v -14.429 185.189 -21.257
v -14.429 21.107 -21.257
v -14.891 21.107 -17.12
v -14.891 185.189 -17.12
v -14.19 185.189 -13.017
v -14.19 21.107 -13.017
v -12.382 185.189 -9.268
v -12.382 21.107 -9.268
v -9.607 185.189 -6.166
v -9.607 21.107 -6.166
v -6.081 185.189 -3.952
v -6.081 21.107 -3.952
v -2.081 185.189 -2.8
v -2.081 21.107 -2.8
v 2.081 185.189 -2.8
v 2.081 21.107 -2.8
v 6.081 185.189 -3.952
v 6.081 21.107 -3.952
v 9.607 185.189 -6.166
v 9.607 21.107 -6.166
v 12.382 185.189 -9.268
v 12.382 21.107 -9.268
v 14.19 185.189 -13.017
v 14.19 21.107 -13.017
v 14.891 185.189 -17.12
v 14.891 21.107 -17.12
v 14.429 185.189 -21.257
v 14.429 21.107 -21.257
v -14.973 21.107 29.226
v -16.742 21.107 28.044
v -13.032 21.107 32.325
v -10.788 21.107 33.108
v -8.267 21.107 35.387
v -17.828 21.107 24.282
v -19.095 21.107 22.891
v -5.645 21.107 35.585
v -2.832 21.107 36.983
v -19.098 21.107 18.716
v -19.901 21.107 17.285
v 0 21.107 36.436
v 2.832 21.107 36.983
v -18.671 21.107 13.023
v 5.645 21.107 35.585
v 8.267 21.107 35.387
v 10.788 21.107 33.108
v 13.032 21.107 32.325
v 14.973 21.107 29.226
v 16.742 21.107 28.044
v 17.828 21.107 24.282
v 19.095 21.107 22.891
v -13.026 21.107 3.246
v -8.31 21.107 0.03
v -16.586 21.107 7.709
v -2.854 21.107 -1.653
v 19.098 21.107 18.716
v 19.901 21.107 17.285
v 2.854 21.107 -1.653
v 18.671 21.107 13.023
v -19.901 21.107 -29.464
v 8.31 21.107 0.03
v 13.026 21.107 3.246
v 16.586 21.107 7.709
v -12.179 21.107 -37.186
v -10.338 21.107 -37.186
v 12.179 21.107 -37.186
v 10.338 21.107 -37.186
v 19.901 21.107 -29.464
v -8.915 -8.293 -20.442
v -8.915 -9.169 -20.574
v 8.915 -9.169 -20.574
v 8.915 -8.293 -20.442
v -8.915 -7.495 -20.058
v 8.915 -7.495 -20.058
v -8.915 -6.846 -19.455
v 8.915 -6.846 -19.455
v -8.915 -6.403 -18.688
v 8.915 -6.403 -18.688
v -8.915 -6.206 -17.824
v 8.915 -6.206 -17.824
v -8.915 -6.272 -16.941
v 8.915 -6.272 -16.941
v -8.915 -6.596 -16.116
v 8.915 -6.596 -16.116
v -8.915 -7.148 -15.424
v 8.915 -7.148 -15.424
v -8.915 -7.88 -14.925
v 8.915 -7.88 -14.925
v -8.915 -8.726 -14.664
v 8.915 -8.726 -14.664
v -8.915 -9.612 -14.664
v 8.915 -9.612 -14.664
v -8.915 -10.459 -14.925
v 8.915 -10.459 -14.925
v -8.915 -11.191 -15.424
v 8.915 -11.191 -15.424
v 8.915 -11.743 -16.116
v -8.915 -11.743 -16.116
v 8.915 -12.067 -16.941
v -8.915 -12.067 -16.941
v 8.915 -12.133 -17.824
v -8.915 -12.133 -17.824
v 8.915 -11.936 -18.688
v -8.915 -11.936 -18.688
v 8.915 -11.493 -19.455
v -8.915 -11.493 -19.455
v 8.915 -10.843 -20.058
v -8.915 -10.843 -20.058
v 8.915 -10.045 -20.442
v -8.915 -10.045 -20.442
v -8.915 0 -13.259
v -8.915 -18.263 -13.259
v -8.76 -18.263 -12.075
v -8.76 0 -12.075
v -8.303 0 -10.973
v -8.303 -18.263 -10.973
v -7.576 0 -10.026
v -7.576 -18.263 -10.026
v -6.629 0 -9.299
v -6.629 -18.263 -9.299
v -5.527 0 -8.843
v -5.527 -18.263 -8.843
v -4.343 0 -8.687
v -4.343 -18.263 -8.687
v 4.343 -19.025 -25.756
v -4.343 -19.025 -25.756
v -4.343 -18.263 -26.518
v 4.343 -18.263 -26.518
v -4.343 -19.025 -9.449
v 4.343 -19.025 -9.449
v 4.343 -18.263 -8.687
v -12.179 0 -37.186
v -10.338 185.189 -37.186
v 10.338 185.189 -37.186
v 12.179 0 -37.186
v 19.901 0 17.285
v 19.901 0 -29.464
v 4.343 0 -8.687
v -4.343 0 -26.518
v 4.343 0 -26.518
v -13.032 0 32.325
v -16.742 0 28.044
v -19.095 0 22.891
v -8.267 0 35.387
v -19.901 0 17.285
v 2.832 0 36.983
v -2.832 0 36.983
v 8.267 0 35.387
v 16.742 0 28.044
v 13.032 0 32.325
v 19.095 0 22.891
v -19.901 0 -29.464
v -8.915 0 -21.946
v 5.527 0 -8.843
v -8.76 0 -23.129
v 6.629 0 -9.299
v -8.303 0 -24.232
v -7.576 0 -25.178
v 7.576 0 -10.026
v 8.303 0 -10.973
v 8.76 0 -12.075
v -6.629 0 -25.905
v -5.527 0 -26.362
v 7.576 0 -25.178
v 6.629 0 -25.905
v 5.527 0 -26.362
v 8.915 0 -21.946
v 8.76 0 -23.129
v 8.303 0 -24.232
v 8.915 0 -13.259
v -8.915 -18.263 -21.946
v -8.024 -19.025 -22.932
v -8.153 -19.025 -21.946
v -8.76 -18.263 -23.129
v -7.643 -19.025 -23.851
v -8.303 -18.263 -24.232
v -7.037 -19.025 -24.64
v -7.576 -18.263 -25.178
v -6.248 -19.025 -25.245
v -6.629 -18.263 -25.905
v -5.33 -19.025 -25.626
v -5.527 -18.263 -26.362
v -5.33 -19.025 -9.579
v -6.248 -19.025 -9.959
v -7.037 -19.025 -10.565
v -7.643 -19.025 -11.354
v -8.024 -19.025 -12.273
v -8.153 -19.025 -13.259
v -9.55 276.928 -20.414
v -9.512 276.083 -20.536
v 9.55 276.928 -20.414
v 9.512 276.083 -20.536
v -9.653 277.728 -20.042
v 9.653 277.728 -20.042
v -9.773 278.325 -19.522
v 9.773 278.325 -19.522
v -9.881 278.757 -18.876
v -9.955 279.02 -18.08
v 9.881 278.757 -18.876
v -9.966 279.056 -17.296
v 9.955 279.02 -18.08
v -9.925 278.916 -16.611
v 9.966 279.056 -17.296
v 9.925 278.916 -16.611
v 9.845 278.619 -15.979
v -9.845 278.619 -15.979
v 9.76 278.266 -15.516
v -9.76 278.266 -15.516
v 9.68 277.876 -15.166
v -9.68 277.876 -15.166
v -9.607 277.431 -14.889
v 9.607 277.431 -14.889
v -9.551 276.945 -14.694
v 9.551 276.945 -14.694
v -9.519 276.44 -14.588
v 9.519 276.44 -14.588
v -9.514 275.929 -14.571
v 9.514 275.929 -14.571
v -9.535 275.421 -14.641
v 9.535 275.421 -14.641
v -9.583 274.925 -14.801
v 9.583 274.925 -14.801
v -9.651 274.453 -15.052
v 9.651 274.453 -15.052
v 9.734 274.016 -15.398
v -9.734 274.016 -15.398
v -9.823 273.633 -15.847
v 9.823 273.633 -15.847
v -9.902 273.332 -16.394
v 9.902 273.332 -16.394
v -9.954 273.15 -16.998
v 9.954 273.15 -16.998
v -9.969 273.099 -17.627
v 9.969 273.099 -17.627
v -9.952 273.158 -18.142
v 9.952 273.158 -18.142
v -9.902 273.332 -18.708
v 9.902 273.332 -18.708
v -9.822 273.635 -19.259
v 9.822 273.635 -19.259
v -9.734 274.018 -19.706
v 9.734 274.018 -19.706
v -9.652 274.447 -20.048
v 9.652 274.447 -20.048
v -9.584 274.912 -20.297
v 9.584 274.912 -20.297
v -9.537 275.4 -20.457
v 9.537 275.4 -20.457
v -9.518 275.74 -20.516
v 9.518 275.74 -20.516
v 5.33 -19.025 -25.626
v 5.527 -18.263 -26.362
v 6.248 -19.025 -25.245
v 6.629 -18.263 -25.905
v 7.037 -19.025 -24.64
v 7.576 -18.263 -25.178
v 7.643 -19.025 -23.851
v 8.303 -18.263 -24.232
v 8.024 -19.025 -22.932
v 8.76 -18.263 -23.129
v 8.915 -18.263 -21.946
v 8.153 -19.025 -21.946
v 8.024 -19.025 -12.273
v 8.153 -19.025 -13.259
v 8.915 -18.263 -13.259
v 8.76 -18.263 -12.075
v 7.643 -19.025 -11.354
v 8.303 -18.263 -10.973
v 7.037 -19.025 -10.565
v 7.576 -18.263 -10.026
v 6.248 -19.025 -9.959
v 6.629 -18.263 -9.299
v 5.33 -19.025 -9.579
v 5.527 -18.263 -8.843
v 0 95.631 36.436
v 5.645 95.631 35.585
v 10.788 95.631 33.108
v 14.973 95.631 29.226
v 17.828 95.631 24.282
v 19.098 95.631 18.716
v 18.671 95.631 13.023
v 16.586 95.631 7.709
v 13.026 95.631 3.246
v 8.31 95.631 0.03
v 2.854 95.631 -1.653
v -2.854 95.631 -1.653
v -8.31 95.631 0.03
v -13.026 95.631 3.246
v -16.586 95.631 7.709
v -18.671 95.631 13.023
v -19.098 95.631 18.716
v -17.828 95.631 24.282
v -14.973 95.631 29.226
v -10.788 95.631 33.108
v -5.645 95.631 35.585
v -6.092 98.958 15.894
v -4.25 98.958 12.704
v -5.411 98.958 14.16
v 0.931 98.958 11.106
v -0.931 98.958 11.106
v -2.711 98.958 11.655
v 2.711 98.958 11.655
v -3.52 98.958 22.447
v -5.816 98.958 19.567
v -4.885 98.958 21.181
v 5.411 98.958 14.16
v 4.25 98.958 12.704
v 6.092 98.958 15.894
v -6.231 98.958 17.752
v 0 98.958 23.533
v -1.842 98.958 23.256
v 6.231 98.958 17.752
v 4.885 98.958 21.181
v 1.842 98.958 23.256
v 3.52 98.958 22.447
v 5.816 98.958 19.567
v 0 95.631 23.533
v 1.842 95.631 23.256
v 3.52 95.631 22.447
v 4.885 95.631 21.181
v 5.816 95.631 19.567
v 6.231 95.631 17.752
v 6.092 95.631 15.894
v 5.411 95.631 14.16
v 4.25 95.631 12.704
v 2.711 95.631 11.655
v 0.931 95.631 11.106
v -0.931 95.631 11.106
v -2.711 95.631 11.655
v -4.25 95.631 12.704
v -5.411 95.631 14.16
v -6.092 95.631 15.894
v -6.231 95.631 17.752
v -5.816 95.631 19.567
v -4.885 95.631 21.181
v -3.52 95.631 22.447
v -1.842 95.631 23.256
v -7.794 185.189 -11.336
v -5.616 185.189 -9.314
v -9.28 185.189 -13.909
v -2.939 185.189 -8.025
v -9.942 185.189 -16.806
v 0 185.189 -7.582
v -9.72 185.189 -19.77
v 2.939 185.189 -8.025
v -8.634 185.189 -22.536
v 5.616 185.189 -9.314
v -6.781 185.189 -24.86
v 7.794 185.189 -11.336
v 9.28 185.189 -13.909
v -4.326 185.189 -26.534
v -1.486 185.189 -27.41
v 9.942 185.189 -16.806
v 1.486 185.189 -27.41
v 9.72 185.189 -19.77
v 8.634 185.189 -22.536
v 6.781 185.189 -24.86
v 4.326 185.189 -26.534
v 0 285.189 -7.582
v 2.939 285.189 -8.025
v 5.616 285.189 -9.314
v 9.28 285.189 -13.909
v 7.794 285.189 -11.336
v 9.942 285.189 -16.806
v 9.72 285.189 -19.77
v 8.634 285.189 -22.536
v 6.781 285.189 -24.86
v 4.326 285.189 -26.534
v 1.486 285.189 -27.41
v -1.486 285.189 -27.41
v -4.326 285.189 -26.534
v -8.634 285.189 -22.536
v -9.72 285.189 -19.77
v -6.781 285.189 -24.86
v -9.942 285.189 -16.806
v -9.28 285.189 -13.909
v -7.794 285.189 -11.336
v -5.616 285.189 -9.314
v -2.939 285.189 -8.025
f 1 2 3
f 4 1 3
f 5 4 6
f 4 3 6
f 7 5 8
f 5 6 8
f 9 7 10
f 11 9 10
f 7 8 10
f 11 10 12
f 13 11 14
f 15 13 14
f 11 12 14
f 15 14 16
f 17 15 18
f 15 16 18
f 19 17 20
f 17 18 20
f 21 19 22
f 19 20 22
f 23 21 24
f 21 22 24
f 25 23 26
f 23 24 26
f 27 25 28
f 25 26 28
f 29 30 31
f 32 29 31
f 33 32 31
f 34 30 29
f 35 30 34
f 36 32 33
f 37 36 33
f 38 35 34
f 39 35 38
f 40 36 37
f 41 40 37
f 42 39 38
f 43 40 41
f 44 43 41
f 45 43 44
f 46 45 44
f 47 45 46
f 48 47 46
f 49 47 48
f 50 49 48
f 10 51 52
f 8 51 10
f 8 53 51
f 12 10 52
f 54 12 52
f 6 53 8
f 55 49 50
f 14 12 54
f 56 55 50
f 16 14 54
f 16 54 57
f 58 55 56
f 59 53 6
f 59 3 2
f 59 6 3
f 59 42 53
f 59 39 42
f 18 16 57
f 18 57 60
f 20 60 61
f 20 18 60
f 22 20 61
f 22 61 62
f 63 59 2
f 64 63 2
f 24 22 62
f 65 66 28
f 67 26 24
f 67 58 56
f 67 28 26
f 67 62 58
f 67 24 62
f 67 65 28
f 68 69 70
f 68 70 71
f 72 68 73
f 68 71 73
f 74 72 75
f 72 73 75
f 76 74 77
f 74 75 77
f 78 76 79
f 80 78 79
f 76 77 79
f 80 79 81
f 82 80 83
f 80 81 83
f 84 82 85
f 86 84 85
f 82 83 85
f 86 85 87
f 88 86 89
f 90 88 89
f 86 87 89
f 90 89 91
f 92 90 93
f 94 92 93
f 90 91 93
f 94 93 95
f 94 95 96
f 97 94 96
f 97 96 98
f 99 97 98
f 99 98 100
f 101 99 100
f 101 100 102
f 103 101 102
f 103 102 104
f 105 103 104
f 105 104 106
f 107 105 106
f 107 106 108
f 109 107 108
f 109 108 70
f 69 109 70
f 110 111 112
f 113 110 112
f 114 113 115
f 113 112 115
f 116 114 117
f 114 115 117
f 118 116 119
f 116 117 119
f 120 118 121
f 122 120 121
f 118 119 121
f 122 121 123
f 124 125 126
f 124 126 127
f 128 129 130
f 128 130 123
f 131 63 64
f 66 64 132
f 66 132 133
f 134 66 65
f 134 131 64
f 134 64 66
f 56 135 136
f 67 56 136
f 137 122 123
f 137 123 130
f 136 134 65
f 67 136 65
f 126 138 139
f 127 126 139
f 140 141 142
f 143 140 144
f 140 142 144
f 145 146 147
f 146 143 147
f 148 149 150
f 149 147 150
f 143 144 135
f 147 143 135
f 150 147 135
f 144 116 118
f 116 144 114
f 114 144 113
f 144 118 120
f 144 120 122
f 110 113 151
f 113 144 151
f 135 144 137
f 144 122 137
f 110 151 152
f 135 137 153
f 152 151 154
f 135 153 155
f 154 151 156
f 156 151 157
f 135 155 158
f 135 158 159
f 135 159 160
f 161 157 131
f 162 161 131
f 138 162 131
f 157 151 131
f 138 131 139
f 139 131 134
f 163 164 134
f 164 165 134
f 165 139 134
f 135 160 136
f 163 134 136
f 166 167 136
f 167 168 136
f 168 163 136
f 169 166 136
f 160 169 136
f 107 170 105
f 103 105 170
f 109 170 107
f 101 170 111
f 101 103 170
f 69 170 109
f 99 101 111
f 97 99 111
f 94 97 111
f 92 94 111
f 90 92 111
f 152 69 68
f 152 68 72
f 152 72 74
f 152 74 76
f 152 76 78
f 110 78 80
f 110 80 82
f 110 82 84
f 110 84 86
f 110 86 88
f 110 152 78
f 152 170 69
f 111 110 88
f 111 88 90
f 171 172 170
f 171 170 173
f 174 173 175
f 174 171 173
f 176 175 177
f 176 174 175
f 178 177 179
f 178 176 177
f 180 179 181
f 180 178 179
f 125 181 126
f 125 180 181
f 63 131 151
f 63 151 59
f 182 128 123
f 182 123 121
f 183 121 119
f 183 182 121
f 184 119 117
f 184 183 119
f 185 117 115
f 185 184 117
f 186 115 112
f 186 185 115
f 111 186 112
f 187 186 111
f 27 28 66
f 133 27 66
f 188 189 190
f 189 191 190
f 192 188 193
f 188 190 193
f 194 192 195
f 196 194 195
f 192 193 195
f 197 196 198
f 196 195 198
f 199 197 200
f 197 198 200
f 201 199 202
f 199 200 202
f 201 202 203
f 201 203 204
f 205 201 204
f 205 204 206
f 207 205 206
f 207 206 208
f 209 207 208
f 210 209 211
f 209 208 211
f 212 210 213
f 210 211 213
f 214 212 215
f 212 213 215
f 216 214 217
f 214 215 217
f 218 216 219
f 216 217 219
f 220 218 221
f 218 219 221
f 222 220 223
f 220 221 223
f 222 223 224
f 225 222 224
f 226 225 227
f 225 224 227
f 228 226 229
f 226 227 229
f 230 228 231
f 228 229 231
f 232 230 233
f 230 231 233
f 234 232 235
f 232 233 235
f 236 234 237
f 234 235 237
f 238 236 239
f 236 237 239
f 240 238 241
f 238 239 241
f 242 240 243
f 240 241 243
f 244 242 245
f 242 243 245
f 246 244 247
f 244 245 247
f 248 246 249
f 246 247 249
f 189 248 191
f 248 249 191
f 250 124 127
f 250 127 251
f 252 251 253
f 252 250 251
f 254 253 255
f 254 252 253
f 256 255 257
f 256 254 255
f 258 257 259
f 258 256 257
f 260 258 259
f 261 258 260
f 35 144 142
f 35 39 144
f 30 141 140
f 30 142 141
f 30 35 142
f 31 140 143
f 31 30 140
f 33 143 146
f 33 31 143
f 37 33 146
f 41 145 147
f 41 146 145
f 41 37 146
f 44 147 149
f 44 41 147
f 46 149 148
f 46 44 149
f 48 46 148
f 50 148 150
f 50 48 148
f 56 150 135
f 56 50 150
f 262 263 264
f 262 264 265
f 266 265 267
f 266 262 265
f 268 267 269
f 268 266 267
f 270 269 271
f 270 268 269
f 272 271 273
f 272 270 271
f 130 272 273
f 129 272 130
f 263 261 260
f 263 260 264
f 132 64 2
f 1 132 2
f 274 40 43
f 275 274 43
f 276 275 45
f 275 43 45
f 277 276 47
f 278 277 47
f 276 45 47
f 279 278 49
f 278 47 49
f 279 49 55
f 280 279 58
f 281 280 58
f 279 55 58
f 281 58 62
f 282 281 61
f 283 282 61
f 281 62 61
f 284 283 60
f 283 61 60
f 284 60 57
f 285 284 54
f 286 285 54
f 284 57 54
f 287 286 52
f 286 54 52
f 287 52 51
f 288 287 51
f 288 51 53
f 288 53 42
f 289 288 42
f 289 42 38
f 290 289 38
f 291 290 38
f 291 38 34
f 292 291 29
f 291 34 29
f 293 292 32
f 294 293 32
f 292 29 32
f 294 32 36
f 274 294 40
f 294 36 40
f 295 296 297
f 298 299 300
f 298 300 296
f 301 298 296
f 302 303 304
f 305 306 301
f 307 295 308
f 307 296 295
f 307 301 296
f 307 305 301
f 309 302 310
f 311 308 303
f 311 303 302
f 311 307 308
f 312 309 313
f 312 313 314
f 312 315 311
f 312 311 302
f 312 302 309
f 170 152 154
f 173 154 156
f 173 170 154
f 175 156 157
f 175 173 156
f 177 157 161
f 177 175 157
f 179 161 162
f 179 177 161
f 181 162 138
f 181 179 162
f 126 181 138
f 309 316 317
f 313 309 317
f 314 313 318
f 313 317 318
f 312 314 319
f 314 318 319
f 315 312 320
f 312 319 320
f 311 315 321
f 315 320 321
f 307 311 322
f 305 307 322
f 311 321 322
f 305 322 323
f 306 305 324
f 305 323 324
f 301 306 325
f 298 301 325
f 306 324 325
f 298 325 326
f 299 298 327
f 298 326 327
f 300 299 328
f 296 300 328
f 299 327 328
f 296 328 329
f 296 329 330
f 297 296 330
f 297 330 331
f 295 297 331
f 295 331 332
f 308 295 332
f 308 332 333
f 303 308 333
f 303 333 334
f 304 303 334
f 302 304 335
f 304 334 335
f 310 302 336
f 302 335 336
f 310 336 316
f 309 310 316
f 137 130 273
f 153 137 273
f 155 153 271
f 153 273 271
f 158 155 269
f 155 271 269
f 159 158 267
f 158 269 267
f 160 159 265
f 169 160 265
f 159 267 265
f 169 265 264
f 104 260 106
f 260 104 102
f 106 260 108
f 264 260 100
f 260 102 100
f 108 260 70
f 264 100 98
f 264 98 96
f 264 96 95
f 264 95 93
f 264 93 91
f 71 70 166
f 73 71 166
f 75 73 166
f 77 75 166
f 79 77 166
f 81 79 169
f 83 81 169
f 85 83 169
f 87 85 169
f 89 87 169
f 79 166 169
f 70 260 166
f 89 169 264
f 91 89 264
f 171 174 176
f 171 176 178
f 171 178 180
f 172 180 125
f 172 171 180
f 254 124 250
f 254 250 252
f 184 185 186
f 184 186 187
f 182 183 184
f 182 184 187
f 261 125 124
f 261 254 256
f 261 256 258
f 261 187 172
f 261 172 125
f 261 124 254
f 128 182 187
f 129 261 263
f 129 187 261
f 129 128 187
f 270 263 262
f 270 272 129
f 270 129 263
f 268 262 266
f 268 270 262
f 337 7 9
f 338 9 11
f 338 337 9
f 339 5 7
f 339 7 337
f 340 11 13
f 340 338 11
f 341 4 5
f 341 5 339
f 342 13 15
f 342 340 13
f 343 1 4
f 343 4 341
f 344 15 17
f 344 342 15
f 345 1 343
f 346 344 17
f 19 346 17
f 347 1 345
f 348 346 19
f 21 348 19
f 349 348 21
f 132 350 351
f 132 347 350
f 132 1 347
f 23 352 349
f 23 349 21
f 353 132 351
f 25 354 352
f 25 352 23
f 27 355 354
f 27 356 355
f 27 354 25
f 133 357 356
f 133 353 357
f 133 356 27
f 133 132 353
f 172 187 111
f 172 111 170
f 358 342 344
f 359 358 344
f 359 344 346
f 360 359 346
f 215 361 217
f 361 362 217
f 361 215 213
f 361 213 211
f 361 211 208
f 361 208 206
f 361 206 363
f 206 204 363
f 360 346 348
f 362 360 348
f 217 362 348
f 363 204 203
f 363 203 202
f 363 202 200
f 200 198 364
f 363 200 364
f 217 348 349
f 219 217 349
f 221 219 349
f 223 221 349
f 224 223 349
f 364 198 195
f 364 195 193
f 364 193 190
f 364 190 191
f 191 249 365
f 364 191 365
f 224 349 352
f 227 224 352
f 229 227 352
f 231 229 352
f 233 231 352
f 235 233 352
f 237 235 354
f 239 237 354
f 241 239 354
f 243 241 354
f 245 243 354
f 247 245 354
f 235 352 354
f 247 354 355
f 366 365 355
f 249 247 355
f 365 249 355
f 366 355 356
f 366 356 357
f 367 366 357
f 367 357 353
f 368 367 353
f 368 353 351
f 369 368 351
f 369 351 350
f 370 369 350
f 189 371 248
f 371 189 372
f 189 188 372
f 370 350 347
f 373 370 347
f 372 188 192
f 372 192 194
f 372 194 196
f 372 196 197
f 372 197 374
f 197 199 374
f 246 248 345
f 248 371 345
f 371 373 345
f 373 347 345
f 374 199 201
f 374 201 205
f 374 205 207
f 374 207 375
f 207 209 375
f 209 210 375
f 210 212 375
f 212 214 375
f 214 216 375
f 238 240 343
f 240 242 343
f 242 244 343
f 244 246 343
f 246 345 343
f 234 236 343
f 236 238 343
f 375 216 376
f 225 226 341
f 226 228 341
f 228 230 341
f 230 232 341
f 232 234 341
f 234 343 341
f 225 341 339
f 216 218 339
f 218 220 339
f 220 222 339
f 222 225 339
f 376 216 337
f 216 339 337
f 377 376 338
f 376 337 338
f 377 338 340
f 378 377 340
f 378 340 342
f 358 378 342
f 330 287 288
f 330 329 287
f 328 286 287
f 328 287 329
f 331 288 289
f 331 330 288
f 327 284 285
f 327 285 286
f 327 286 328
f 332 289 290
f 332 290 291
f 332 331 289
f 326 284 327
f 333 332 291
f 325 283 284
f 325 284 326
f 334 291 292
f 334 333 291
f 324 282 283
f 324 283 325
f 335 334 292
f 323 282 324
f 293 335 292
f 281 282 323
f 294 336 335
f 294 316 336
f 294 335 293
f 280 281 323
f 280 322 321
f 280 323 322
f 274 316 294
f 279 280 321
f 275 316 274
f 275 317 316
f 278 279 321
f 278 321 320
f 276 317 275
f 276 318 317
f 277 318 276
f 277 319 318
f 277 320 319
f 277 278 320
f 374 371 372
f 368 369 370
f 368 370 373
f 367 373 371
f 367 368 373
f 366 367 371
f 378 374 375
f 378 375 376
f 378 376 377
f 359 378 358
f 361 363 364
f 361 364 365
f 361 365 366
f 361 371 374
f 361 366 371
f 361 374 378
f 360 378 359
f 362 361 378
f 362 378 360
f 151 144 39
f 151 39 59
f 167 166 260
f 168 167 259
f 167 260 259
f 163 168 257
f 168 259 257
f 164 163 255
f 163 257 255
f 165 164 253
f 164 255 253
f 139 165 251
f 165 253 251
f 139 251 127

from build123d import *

# Parameters (mm, degrees)
SKETCH1_W                                    = 39.8018
SKETCH1_H                                    = 74.3712
BOSS_EXTRUDE1_SHOWN_IS_A_4_INCH_ACTUAT_DEPTH = 21.1074
FILLET1_RADIUS                               = 19.9009
FILLET1_LENGTH                               = 21.1074
CHAMFER1_SIZE                                = 7.7216
SKETCH2_R                                    = 19.1516
BOSS_EXTRUDE2_DEPTH                          = 74.5236
SKETCH3_R                                    = 6.2484
BOSS_EXTRUDE3_DEPTH                          = 3.3274
SKETCH4_W                                    = 17.8308
SKETCH4_H                                    = 17.8308
BOSS_EXTRUDE4_DEPTH                          = 19.0246
SKETCH5_R                                    = 2.9718
CUT_EXTRUDE1_DEPTH                           = 110.571496858
FILLET2_R                                    = 4.572
CHAMFER3_SIZE                                = 0.762
BODY_EXTRUDE_DEPTH                           = 164.08146
SKETCH7_R                                    = 9.9695
SHAFT_EXTRUDE_DEPTH                          = 100
SKETCH8_R                                    = 2.9845
CUT_EXTRUDE2_DEPTH                           = 12.7


with BuildPart() as part:
    # Sketch1 → Boss-Extrude1 - Shown is a 4 Inch Actuator (new body)
    with BuildSketch(Plane(origin=(0, 0, 0), x_dir=(1, 0, 0), z_dir=(0, 1, 0))):
        Rectangle(SKETCH1_W, SKETCH1_H)
    extrude(amount=BOSS_EXTRUDE1_SHOWN_IS_A_4_INCH_ACTUAT_DEPTH)

    # Fillet1: full round fillet: the end face becomes a half cylinder, R = half its width
    fillet1_face = Plane((0, 10.5537, 37.1856), x_dir=(0, 1, 0), z_dir=(0, 0, 1))  # on the end face: x along it, z out of the body
    fillet1_slab = fillet1_face.offset(-FILLET1_RADIUS / 2) * Box(FILLET1_LENGTH, 2 * FILLET1_RADIUS, FILLET1_RADIUS, mode=Mode.PRIVATE)  # the body's end, R deep
    fillet1_round = Plane((0, 10.5537, 17.2847), x_dir=(0, 0, 1), z_dir=(0, 1, 0)) * Cylinder(FILLET1_RADIUS, FILLET1_LENGTH, mode=Mode.PRIVATE)  # its axis R under the face
    add(fillet1_slab - fillet1_round, mode=Mode.SUBTRACT)

    # Chamfer1
    chamfer1_edges = [part.edges().sort_by_distance(p)[0] for p in [
        (-19.9009, 10.5537, -37.1856),
        (19.9009, 10.5537, -37.1856),
    ]]
    chamfer(chamfer1_edges, length=CHAMFER1_SIZE)

    # Sketch2 → Boss-Extrude2 (add)
    with BuildSketch(Plane(origin=(0, 21.1074, 0), x_dir=(1, 0, 0), z_dir=(0, 1, 0))):
        with Locations(Location((0, -17.2847, 0), (0, 0, 270))):
            Circle(SKETCH2_R)
    extrude(amount=BOSS_EXTRUDE2_DEPTH)

    # Sketch3 → Boss-Extrude3 (add)
    with BuildSketch(Plane(origin=(0, 95.631, 0), x_dir=(1, 0, 0), z_dir=(0, 1, 0))):
        with Locations(Location((0, -17.2847, 0), (0, 0, 270))):
            Circle(SKETCH3_R)
    extrude(amount=BOSS_EXTRUDE3_DEPTH)

    # Sketch4 → Boss-Extrude4 (add)
    with BuildSketch(Plane.XZ):
        with Locations((0, -17.6022)):
            Rectangle(SKETCH4_W, SKETCH4_H)
    extrude(amount=BOSS_EXTRUDE4_DEPTH)

    # Sketch5 → Cut-Extrude1 (cut, through all)
    with BuildSketch(Plane(origin=(8.9154, 0, 0), x_dir=(0, 0, -1), z_dir=(1, 0, 0))):
        with Locations((17.6022, -9.1694)):
            Circle(SKETCH5_R)
    extrude(amount=-CUT_EXTRUDE1_DEPTH, mode=Mode.SUBTRACT)

    # Fillet2
    fillet2_edges = [part.edges().sort_by_distance(p)[0] for p in [
        (8.9154, -9.5123, -26.5176),
        (8.9154, -9.5123, -8.6868),
        (-8.9154, -9.5123, -8.6868),
        (-8.9154, -9.5123, -26.5176),
    ]]
    fillet(fillet2_edges, radius=FILLET2_R)

    # Chamfer3
    chamfer3_edges = [part.edges().sort_by_distance(p)[0] for p in [
        (0, -19.0246, -26.5176),
        (-8.9154, -19.0246, -17.6022),
        (8.9154, -19.0246, -17.6022),
        (0, -19.0246, -8.6868),
        (7.576292204, -19.0246, -10.025907796),
        (7.576292204, -19.0246, -25.178492204),
        (-7.576292204, -19.0246, -10.025907796),
        (-7.576292204, -19.0246, -25.178492204),
    ]]
    chamfer(chamfer3_edges, length=CHAMFER3_SIZE)

    # Sketch6 → Body Extrude (add)
    with BuildSketch(Plane(origin=(0, 21.1074, 0), x_dir=(1, 0, 0), z_dir=(0, 1, 0))):
        with BuildLine():
            Line((0, 37.1856), (-10.3378, 37.1856))
            Line((-10.3378, 37.1856), (-14.428797676, 21.257258339))
            ThreePointArc((-14.428797676, 21.257258339), (0, 2.6543), (14.428797676, 21.257258339))
            Line((14.428797676, 21.257258339), (10.3378, 37.1856))
            Line((10.3378, 37.1856), (0, 37.1856))
        make_face()
    extrude(amount=BODY_EXTRUDE_DEPTH)

    # Sketch7 → Shaft Extrude (add)
    with BuildSketch(Plane(origin=(0, 185.18886, 0), x_dir=(1, 0, 0), z_dir=(0, 1, 0))):
        with Locations(Location((0, 17.5514, 0), (0, 0, 270))):
            Circle(SKETCH7_R)
    extrude(amount=SHAFT_EXTRUDE_DEPTH)

    # Sketch8 → Cut-Extrude2 (cut, symmetric)
    with BuildSketch(Plane(origin=(0, 0, 0), x_dir=(0, 0, -1), z_dir=(1, 0, 0))):
        with Locations((17.5514, 276.08296)):
            Circle(SKETCH8_R)
    extrude(amount=CUT_EXTRUDE2_DEPTH, both=True, mode=Mode.SUBTRACT)


solid = part.part
